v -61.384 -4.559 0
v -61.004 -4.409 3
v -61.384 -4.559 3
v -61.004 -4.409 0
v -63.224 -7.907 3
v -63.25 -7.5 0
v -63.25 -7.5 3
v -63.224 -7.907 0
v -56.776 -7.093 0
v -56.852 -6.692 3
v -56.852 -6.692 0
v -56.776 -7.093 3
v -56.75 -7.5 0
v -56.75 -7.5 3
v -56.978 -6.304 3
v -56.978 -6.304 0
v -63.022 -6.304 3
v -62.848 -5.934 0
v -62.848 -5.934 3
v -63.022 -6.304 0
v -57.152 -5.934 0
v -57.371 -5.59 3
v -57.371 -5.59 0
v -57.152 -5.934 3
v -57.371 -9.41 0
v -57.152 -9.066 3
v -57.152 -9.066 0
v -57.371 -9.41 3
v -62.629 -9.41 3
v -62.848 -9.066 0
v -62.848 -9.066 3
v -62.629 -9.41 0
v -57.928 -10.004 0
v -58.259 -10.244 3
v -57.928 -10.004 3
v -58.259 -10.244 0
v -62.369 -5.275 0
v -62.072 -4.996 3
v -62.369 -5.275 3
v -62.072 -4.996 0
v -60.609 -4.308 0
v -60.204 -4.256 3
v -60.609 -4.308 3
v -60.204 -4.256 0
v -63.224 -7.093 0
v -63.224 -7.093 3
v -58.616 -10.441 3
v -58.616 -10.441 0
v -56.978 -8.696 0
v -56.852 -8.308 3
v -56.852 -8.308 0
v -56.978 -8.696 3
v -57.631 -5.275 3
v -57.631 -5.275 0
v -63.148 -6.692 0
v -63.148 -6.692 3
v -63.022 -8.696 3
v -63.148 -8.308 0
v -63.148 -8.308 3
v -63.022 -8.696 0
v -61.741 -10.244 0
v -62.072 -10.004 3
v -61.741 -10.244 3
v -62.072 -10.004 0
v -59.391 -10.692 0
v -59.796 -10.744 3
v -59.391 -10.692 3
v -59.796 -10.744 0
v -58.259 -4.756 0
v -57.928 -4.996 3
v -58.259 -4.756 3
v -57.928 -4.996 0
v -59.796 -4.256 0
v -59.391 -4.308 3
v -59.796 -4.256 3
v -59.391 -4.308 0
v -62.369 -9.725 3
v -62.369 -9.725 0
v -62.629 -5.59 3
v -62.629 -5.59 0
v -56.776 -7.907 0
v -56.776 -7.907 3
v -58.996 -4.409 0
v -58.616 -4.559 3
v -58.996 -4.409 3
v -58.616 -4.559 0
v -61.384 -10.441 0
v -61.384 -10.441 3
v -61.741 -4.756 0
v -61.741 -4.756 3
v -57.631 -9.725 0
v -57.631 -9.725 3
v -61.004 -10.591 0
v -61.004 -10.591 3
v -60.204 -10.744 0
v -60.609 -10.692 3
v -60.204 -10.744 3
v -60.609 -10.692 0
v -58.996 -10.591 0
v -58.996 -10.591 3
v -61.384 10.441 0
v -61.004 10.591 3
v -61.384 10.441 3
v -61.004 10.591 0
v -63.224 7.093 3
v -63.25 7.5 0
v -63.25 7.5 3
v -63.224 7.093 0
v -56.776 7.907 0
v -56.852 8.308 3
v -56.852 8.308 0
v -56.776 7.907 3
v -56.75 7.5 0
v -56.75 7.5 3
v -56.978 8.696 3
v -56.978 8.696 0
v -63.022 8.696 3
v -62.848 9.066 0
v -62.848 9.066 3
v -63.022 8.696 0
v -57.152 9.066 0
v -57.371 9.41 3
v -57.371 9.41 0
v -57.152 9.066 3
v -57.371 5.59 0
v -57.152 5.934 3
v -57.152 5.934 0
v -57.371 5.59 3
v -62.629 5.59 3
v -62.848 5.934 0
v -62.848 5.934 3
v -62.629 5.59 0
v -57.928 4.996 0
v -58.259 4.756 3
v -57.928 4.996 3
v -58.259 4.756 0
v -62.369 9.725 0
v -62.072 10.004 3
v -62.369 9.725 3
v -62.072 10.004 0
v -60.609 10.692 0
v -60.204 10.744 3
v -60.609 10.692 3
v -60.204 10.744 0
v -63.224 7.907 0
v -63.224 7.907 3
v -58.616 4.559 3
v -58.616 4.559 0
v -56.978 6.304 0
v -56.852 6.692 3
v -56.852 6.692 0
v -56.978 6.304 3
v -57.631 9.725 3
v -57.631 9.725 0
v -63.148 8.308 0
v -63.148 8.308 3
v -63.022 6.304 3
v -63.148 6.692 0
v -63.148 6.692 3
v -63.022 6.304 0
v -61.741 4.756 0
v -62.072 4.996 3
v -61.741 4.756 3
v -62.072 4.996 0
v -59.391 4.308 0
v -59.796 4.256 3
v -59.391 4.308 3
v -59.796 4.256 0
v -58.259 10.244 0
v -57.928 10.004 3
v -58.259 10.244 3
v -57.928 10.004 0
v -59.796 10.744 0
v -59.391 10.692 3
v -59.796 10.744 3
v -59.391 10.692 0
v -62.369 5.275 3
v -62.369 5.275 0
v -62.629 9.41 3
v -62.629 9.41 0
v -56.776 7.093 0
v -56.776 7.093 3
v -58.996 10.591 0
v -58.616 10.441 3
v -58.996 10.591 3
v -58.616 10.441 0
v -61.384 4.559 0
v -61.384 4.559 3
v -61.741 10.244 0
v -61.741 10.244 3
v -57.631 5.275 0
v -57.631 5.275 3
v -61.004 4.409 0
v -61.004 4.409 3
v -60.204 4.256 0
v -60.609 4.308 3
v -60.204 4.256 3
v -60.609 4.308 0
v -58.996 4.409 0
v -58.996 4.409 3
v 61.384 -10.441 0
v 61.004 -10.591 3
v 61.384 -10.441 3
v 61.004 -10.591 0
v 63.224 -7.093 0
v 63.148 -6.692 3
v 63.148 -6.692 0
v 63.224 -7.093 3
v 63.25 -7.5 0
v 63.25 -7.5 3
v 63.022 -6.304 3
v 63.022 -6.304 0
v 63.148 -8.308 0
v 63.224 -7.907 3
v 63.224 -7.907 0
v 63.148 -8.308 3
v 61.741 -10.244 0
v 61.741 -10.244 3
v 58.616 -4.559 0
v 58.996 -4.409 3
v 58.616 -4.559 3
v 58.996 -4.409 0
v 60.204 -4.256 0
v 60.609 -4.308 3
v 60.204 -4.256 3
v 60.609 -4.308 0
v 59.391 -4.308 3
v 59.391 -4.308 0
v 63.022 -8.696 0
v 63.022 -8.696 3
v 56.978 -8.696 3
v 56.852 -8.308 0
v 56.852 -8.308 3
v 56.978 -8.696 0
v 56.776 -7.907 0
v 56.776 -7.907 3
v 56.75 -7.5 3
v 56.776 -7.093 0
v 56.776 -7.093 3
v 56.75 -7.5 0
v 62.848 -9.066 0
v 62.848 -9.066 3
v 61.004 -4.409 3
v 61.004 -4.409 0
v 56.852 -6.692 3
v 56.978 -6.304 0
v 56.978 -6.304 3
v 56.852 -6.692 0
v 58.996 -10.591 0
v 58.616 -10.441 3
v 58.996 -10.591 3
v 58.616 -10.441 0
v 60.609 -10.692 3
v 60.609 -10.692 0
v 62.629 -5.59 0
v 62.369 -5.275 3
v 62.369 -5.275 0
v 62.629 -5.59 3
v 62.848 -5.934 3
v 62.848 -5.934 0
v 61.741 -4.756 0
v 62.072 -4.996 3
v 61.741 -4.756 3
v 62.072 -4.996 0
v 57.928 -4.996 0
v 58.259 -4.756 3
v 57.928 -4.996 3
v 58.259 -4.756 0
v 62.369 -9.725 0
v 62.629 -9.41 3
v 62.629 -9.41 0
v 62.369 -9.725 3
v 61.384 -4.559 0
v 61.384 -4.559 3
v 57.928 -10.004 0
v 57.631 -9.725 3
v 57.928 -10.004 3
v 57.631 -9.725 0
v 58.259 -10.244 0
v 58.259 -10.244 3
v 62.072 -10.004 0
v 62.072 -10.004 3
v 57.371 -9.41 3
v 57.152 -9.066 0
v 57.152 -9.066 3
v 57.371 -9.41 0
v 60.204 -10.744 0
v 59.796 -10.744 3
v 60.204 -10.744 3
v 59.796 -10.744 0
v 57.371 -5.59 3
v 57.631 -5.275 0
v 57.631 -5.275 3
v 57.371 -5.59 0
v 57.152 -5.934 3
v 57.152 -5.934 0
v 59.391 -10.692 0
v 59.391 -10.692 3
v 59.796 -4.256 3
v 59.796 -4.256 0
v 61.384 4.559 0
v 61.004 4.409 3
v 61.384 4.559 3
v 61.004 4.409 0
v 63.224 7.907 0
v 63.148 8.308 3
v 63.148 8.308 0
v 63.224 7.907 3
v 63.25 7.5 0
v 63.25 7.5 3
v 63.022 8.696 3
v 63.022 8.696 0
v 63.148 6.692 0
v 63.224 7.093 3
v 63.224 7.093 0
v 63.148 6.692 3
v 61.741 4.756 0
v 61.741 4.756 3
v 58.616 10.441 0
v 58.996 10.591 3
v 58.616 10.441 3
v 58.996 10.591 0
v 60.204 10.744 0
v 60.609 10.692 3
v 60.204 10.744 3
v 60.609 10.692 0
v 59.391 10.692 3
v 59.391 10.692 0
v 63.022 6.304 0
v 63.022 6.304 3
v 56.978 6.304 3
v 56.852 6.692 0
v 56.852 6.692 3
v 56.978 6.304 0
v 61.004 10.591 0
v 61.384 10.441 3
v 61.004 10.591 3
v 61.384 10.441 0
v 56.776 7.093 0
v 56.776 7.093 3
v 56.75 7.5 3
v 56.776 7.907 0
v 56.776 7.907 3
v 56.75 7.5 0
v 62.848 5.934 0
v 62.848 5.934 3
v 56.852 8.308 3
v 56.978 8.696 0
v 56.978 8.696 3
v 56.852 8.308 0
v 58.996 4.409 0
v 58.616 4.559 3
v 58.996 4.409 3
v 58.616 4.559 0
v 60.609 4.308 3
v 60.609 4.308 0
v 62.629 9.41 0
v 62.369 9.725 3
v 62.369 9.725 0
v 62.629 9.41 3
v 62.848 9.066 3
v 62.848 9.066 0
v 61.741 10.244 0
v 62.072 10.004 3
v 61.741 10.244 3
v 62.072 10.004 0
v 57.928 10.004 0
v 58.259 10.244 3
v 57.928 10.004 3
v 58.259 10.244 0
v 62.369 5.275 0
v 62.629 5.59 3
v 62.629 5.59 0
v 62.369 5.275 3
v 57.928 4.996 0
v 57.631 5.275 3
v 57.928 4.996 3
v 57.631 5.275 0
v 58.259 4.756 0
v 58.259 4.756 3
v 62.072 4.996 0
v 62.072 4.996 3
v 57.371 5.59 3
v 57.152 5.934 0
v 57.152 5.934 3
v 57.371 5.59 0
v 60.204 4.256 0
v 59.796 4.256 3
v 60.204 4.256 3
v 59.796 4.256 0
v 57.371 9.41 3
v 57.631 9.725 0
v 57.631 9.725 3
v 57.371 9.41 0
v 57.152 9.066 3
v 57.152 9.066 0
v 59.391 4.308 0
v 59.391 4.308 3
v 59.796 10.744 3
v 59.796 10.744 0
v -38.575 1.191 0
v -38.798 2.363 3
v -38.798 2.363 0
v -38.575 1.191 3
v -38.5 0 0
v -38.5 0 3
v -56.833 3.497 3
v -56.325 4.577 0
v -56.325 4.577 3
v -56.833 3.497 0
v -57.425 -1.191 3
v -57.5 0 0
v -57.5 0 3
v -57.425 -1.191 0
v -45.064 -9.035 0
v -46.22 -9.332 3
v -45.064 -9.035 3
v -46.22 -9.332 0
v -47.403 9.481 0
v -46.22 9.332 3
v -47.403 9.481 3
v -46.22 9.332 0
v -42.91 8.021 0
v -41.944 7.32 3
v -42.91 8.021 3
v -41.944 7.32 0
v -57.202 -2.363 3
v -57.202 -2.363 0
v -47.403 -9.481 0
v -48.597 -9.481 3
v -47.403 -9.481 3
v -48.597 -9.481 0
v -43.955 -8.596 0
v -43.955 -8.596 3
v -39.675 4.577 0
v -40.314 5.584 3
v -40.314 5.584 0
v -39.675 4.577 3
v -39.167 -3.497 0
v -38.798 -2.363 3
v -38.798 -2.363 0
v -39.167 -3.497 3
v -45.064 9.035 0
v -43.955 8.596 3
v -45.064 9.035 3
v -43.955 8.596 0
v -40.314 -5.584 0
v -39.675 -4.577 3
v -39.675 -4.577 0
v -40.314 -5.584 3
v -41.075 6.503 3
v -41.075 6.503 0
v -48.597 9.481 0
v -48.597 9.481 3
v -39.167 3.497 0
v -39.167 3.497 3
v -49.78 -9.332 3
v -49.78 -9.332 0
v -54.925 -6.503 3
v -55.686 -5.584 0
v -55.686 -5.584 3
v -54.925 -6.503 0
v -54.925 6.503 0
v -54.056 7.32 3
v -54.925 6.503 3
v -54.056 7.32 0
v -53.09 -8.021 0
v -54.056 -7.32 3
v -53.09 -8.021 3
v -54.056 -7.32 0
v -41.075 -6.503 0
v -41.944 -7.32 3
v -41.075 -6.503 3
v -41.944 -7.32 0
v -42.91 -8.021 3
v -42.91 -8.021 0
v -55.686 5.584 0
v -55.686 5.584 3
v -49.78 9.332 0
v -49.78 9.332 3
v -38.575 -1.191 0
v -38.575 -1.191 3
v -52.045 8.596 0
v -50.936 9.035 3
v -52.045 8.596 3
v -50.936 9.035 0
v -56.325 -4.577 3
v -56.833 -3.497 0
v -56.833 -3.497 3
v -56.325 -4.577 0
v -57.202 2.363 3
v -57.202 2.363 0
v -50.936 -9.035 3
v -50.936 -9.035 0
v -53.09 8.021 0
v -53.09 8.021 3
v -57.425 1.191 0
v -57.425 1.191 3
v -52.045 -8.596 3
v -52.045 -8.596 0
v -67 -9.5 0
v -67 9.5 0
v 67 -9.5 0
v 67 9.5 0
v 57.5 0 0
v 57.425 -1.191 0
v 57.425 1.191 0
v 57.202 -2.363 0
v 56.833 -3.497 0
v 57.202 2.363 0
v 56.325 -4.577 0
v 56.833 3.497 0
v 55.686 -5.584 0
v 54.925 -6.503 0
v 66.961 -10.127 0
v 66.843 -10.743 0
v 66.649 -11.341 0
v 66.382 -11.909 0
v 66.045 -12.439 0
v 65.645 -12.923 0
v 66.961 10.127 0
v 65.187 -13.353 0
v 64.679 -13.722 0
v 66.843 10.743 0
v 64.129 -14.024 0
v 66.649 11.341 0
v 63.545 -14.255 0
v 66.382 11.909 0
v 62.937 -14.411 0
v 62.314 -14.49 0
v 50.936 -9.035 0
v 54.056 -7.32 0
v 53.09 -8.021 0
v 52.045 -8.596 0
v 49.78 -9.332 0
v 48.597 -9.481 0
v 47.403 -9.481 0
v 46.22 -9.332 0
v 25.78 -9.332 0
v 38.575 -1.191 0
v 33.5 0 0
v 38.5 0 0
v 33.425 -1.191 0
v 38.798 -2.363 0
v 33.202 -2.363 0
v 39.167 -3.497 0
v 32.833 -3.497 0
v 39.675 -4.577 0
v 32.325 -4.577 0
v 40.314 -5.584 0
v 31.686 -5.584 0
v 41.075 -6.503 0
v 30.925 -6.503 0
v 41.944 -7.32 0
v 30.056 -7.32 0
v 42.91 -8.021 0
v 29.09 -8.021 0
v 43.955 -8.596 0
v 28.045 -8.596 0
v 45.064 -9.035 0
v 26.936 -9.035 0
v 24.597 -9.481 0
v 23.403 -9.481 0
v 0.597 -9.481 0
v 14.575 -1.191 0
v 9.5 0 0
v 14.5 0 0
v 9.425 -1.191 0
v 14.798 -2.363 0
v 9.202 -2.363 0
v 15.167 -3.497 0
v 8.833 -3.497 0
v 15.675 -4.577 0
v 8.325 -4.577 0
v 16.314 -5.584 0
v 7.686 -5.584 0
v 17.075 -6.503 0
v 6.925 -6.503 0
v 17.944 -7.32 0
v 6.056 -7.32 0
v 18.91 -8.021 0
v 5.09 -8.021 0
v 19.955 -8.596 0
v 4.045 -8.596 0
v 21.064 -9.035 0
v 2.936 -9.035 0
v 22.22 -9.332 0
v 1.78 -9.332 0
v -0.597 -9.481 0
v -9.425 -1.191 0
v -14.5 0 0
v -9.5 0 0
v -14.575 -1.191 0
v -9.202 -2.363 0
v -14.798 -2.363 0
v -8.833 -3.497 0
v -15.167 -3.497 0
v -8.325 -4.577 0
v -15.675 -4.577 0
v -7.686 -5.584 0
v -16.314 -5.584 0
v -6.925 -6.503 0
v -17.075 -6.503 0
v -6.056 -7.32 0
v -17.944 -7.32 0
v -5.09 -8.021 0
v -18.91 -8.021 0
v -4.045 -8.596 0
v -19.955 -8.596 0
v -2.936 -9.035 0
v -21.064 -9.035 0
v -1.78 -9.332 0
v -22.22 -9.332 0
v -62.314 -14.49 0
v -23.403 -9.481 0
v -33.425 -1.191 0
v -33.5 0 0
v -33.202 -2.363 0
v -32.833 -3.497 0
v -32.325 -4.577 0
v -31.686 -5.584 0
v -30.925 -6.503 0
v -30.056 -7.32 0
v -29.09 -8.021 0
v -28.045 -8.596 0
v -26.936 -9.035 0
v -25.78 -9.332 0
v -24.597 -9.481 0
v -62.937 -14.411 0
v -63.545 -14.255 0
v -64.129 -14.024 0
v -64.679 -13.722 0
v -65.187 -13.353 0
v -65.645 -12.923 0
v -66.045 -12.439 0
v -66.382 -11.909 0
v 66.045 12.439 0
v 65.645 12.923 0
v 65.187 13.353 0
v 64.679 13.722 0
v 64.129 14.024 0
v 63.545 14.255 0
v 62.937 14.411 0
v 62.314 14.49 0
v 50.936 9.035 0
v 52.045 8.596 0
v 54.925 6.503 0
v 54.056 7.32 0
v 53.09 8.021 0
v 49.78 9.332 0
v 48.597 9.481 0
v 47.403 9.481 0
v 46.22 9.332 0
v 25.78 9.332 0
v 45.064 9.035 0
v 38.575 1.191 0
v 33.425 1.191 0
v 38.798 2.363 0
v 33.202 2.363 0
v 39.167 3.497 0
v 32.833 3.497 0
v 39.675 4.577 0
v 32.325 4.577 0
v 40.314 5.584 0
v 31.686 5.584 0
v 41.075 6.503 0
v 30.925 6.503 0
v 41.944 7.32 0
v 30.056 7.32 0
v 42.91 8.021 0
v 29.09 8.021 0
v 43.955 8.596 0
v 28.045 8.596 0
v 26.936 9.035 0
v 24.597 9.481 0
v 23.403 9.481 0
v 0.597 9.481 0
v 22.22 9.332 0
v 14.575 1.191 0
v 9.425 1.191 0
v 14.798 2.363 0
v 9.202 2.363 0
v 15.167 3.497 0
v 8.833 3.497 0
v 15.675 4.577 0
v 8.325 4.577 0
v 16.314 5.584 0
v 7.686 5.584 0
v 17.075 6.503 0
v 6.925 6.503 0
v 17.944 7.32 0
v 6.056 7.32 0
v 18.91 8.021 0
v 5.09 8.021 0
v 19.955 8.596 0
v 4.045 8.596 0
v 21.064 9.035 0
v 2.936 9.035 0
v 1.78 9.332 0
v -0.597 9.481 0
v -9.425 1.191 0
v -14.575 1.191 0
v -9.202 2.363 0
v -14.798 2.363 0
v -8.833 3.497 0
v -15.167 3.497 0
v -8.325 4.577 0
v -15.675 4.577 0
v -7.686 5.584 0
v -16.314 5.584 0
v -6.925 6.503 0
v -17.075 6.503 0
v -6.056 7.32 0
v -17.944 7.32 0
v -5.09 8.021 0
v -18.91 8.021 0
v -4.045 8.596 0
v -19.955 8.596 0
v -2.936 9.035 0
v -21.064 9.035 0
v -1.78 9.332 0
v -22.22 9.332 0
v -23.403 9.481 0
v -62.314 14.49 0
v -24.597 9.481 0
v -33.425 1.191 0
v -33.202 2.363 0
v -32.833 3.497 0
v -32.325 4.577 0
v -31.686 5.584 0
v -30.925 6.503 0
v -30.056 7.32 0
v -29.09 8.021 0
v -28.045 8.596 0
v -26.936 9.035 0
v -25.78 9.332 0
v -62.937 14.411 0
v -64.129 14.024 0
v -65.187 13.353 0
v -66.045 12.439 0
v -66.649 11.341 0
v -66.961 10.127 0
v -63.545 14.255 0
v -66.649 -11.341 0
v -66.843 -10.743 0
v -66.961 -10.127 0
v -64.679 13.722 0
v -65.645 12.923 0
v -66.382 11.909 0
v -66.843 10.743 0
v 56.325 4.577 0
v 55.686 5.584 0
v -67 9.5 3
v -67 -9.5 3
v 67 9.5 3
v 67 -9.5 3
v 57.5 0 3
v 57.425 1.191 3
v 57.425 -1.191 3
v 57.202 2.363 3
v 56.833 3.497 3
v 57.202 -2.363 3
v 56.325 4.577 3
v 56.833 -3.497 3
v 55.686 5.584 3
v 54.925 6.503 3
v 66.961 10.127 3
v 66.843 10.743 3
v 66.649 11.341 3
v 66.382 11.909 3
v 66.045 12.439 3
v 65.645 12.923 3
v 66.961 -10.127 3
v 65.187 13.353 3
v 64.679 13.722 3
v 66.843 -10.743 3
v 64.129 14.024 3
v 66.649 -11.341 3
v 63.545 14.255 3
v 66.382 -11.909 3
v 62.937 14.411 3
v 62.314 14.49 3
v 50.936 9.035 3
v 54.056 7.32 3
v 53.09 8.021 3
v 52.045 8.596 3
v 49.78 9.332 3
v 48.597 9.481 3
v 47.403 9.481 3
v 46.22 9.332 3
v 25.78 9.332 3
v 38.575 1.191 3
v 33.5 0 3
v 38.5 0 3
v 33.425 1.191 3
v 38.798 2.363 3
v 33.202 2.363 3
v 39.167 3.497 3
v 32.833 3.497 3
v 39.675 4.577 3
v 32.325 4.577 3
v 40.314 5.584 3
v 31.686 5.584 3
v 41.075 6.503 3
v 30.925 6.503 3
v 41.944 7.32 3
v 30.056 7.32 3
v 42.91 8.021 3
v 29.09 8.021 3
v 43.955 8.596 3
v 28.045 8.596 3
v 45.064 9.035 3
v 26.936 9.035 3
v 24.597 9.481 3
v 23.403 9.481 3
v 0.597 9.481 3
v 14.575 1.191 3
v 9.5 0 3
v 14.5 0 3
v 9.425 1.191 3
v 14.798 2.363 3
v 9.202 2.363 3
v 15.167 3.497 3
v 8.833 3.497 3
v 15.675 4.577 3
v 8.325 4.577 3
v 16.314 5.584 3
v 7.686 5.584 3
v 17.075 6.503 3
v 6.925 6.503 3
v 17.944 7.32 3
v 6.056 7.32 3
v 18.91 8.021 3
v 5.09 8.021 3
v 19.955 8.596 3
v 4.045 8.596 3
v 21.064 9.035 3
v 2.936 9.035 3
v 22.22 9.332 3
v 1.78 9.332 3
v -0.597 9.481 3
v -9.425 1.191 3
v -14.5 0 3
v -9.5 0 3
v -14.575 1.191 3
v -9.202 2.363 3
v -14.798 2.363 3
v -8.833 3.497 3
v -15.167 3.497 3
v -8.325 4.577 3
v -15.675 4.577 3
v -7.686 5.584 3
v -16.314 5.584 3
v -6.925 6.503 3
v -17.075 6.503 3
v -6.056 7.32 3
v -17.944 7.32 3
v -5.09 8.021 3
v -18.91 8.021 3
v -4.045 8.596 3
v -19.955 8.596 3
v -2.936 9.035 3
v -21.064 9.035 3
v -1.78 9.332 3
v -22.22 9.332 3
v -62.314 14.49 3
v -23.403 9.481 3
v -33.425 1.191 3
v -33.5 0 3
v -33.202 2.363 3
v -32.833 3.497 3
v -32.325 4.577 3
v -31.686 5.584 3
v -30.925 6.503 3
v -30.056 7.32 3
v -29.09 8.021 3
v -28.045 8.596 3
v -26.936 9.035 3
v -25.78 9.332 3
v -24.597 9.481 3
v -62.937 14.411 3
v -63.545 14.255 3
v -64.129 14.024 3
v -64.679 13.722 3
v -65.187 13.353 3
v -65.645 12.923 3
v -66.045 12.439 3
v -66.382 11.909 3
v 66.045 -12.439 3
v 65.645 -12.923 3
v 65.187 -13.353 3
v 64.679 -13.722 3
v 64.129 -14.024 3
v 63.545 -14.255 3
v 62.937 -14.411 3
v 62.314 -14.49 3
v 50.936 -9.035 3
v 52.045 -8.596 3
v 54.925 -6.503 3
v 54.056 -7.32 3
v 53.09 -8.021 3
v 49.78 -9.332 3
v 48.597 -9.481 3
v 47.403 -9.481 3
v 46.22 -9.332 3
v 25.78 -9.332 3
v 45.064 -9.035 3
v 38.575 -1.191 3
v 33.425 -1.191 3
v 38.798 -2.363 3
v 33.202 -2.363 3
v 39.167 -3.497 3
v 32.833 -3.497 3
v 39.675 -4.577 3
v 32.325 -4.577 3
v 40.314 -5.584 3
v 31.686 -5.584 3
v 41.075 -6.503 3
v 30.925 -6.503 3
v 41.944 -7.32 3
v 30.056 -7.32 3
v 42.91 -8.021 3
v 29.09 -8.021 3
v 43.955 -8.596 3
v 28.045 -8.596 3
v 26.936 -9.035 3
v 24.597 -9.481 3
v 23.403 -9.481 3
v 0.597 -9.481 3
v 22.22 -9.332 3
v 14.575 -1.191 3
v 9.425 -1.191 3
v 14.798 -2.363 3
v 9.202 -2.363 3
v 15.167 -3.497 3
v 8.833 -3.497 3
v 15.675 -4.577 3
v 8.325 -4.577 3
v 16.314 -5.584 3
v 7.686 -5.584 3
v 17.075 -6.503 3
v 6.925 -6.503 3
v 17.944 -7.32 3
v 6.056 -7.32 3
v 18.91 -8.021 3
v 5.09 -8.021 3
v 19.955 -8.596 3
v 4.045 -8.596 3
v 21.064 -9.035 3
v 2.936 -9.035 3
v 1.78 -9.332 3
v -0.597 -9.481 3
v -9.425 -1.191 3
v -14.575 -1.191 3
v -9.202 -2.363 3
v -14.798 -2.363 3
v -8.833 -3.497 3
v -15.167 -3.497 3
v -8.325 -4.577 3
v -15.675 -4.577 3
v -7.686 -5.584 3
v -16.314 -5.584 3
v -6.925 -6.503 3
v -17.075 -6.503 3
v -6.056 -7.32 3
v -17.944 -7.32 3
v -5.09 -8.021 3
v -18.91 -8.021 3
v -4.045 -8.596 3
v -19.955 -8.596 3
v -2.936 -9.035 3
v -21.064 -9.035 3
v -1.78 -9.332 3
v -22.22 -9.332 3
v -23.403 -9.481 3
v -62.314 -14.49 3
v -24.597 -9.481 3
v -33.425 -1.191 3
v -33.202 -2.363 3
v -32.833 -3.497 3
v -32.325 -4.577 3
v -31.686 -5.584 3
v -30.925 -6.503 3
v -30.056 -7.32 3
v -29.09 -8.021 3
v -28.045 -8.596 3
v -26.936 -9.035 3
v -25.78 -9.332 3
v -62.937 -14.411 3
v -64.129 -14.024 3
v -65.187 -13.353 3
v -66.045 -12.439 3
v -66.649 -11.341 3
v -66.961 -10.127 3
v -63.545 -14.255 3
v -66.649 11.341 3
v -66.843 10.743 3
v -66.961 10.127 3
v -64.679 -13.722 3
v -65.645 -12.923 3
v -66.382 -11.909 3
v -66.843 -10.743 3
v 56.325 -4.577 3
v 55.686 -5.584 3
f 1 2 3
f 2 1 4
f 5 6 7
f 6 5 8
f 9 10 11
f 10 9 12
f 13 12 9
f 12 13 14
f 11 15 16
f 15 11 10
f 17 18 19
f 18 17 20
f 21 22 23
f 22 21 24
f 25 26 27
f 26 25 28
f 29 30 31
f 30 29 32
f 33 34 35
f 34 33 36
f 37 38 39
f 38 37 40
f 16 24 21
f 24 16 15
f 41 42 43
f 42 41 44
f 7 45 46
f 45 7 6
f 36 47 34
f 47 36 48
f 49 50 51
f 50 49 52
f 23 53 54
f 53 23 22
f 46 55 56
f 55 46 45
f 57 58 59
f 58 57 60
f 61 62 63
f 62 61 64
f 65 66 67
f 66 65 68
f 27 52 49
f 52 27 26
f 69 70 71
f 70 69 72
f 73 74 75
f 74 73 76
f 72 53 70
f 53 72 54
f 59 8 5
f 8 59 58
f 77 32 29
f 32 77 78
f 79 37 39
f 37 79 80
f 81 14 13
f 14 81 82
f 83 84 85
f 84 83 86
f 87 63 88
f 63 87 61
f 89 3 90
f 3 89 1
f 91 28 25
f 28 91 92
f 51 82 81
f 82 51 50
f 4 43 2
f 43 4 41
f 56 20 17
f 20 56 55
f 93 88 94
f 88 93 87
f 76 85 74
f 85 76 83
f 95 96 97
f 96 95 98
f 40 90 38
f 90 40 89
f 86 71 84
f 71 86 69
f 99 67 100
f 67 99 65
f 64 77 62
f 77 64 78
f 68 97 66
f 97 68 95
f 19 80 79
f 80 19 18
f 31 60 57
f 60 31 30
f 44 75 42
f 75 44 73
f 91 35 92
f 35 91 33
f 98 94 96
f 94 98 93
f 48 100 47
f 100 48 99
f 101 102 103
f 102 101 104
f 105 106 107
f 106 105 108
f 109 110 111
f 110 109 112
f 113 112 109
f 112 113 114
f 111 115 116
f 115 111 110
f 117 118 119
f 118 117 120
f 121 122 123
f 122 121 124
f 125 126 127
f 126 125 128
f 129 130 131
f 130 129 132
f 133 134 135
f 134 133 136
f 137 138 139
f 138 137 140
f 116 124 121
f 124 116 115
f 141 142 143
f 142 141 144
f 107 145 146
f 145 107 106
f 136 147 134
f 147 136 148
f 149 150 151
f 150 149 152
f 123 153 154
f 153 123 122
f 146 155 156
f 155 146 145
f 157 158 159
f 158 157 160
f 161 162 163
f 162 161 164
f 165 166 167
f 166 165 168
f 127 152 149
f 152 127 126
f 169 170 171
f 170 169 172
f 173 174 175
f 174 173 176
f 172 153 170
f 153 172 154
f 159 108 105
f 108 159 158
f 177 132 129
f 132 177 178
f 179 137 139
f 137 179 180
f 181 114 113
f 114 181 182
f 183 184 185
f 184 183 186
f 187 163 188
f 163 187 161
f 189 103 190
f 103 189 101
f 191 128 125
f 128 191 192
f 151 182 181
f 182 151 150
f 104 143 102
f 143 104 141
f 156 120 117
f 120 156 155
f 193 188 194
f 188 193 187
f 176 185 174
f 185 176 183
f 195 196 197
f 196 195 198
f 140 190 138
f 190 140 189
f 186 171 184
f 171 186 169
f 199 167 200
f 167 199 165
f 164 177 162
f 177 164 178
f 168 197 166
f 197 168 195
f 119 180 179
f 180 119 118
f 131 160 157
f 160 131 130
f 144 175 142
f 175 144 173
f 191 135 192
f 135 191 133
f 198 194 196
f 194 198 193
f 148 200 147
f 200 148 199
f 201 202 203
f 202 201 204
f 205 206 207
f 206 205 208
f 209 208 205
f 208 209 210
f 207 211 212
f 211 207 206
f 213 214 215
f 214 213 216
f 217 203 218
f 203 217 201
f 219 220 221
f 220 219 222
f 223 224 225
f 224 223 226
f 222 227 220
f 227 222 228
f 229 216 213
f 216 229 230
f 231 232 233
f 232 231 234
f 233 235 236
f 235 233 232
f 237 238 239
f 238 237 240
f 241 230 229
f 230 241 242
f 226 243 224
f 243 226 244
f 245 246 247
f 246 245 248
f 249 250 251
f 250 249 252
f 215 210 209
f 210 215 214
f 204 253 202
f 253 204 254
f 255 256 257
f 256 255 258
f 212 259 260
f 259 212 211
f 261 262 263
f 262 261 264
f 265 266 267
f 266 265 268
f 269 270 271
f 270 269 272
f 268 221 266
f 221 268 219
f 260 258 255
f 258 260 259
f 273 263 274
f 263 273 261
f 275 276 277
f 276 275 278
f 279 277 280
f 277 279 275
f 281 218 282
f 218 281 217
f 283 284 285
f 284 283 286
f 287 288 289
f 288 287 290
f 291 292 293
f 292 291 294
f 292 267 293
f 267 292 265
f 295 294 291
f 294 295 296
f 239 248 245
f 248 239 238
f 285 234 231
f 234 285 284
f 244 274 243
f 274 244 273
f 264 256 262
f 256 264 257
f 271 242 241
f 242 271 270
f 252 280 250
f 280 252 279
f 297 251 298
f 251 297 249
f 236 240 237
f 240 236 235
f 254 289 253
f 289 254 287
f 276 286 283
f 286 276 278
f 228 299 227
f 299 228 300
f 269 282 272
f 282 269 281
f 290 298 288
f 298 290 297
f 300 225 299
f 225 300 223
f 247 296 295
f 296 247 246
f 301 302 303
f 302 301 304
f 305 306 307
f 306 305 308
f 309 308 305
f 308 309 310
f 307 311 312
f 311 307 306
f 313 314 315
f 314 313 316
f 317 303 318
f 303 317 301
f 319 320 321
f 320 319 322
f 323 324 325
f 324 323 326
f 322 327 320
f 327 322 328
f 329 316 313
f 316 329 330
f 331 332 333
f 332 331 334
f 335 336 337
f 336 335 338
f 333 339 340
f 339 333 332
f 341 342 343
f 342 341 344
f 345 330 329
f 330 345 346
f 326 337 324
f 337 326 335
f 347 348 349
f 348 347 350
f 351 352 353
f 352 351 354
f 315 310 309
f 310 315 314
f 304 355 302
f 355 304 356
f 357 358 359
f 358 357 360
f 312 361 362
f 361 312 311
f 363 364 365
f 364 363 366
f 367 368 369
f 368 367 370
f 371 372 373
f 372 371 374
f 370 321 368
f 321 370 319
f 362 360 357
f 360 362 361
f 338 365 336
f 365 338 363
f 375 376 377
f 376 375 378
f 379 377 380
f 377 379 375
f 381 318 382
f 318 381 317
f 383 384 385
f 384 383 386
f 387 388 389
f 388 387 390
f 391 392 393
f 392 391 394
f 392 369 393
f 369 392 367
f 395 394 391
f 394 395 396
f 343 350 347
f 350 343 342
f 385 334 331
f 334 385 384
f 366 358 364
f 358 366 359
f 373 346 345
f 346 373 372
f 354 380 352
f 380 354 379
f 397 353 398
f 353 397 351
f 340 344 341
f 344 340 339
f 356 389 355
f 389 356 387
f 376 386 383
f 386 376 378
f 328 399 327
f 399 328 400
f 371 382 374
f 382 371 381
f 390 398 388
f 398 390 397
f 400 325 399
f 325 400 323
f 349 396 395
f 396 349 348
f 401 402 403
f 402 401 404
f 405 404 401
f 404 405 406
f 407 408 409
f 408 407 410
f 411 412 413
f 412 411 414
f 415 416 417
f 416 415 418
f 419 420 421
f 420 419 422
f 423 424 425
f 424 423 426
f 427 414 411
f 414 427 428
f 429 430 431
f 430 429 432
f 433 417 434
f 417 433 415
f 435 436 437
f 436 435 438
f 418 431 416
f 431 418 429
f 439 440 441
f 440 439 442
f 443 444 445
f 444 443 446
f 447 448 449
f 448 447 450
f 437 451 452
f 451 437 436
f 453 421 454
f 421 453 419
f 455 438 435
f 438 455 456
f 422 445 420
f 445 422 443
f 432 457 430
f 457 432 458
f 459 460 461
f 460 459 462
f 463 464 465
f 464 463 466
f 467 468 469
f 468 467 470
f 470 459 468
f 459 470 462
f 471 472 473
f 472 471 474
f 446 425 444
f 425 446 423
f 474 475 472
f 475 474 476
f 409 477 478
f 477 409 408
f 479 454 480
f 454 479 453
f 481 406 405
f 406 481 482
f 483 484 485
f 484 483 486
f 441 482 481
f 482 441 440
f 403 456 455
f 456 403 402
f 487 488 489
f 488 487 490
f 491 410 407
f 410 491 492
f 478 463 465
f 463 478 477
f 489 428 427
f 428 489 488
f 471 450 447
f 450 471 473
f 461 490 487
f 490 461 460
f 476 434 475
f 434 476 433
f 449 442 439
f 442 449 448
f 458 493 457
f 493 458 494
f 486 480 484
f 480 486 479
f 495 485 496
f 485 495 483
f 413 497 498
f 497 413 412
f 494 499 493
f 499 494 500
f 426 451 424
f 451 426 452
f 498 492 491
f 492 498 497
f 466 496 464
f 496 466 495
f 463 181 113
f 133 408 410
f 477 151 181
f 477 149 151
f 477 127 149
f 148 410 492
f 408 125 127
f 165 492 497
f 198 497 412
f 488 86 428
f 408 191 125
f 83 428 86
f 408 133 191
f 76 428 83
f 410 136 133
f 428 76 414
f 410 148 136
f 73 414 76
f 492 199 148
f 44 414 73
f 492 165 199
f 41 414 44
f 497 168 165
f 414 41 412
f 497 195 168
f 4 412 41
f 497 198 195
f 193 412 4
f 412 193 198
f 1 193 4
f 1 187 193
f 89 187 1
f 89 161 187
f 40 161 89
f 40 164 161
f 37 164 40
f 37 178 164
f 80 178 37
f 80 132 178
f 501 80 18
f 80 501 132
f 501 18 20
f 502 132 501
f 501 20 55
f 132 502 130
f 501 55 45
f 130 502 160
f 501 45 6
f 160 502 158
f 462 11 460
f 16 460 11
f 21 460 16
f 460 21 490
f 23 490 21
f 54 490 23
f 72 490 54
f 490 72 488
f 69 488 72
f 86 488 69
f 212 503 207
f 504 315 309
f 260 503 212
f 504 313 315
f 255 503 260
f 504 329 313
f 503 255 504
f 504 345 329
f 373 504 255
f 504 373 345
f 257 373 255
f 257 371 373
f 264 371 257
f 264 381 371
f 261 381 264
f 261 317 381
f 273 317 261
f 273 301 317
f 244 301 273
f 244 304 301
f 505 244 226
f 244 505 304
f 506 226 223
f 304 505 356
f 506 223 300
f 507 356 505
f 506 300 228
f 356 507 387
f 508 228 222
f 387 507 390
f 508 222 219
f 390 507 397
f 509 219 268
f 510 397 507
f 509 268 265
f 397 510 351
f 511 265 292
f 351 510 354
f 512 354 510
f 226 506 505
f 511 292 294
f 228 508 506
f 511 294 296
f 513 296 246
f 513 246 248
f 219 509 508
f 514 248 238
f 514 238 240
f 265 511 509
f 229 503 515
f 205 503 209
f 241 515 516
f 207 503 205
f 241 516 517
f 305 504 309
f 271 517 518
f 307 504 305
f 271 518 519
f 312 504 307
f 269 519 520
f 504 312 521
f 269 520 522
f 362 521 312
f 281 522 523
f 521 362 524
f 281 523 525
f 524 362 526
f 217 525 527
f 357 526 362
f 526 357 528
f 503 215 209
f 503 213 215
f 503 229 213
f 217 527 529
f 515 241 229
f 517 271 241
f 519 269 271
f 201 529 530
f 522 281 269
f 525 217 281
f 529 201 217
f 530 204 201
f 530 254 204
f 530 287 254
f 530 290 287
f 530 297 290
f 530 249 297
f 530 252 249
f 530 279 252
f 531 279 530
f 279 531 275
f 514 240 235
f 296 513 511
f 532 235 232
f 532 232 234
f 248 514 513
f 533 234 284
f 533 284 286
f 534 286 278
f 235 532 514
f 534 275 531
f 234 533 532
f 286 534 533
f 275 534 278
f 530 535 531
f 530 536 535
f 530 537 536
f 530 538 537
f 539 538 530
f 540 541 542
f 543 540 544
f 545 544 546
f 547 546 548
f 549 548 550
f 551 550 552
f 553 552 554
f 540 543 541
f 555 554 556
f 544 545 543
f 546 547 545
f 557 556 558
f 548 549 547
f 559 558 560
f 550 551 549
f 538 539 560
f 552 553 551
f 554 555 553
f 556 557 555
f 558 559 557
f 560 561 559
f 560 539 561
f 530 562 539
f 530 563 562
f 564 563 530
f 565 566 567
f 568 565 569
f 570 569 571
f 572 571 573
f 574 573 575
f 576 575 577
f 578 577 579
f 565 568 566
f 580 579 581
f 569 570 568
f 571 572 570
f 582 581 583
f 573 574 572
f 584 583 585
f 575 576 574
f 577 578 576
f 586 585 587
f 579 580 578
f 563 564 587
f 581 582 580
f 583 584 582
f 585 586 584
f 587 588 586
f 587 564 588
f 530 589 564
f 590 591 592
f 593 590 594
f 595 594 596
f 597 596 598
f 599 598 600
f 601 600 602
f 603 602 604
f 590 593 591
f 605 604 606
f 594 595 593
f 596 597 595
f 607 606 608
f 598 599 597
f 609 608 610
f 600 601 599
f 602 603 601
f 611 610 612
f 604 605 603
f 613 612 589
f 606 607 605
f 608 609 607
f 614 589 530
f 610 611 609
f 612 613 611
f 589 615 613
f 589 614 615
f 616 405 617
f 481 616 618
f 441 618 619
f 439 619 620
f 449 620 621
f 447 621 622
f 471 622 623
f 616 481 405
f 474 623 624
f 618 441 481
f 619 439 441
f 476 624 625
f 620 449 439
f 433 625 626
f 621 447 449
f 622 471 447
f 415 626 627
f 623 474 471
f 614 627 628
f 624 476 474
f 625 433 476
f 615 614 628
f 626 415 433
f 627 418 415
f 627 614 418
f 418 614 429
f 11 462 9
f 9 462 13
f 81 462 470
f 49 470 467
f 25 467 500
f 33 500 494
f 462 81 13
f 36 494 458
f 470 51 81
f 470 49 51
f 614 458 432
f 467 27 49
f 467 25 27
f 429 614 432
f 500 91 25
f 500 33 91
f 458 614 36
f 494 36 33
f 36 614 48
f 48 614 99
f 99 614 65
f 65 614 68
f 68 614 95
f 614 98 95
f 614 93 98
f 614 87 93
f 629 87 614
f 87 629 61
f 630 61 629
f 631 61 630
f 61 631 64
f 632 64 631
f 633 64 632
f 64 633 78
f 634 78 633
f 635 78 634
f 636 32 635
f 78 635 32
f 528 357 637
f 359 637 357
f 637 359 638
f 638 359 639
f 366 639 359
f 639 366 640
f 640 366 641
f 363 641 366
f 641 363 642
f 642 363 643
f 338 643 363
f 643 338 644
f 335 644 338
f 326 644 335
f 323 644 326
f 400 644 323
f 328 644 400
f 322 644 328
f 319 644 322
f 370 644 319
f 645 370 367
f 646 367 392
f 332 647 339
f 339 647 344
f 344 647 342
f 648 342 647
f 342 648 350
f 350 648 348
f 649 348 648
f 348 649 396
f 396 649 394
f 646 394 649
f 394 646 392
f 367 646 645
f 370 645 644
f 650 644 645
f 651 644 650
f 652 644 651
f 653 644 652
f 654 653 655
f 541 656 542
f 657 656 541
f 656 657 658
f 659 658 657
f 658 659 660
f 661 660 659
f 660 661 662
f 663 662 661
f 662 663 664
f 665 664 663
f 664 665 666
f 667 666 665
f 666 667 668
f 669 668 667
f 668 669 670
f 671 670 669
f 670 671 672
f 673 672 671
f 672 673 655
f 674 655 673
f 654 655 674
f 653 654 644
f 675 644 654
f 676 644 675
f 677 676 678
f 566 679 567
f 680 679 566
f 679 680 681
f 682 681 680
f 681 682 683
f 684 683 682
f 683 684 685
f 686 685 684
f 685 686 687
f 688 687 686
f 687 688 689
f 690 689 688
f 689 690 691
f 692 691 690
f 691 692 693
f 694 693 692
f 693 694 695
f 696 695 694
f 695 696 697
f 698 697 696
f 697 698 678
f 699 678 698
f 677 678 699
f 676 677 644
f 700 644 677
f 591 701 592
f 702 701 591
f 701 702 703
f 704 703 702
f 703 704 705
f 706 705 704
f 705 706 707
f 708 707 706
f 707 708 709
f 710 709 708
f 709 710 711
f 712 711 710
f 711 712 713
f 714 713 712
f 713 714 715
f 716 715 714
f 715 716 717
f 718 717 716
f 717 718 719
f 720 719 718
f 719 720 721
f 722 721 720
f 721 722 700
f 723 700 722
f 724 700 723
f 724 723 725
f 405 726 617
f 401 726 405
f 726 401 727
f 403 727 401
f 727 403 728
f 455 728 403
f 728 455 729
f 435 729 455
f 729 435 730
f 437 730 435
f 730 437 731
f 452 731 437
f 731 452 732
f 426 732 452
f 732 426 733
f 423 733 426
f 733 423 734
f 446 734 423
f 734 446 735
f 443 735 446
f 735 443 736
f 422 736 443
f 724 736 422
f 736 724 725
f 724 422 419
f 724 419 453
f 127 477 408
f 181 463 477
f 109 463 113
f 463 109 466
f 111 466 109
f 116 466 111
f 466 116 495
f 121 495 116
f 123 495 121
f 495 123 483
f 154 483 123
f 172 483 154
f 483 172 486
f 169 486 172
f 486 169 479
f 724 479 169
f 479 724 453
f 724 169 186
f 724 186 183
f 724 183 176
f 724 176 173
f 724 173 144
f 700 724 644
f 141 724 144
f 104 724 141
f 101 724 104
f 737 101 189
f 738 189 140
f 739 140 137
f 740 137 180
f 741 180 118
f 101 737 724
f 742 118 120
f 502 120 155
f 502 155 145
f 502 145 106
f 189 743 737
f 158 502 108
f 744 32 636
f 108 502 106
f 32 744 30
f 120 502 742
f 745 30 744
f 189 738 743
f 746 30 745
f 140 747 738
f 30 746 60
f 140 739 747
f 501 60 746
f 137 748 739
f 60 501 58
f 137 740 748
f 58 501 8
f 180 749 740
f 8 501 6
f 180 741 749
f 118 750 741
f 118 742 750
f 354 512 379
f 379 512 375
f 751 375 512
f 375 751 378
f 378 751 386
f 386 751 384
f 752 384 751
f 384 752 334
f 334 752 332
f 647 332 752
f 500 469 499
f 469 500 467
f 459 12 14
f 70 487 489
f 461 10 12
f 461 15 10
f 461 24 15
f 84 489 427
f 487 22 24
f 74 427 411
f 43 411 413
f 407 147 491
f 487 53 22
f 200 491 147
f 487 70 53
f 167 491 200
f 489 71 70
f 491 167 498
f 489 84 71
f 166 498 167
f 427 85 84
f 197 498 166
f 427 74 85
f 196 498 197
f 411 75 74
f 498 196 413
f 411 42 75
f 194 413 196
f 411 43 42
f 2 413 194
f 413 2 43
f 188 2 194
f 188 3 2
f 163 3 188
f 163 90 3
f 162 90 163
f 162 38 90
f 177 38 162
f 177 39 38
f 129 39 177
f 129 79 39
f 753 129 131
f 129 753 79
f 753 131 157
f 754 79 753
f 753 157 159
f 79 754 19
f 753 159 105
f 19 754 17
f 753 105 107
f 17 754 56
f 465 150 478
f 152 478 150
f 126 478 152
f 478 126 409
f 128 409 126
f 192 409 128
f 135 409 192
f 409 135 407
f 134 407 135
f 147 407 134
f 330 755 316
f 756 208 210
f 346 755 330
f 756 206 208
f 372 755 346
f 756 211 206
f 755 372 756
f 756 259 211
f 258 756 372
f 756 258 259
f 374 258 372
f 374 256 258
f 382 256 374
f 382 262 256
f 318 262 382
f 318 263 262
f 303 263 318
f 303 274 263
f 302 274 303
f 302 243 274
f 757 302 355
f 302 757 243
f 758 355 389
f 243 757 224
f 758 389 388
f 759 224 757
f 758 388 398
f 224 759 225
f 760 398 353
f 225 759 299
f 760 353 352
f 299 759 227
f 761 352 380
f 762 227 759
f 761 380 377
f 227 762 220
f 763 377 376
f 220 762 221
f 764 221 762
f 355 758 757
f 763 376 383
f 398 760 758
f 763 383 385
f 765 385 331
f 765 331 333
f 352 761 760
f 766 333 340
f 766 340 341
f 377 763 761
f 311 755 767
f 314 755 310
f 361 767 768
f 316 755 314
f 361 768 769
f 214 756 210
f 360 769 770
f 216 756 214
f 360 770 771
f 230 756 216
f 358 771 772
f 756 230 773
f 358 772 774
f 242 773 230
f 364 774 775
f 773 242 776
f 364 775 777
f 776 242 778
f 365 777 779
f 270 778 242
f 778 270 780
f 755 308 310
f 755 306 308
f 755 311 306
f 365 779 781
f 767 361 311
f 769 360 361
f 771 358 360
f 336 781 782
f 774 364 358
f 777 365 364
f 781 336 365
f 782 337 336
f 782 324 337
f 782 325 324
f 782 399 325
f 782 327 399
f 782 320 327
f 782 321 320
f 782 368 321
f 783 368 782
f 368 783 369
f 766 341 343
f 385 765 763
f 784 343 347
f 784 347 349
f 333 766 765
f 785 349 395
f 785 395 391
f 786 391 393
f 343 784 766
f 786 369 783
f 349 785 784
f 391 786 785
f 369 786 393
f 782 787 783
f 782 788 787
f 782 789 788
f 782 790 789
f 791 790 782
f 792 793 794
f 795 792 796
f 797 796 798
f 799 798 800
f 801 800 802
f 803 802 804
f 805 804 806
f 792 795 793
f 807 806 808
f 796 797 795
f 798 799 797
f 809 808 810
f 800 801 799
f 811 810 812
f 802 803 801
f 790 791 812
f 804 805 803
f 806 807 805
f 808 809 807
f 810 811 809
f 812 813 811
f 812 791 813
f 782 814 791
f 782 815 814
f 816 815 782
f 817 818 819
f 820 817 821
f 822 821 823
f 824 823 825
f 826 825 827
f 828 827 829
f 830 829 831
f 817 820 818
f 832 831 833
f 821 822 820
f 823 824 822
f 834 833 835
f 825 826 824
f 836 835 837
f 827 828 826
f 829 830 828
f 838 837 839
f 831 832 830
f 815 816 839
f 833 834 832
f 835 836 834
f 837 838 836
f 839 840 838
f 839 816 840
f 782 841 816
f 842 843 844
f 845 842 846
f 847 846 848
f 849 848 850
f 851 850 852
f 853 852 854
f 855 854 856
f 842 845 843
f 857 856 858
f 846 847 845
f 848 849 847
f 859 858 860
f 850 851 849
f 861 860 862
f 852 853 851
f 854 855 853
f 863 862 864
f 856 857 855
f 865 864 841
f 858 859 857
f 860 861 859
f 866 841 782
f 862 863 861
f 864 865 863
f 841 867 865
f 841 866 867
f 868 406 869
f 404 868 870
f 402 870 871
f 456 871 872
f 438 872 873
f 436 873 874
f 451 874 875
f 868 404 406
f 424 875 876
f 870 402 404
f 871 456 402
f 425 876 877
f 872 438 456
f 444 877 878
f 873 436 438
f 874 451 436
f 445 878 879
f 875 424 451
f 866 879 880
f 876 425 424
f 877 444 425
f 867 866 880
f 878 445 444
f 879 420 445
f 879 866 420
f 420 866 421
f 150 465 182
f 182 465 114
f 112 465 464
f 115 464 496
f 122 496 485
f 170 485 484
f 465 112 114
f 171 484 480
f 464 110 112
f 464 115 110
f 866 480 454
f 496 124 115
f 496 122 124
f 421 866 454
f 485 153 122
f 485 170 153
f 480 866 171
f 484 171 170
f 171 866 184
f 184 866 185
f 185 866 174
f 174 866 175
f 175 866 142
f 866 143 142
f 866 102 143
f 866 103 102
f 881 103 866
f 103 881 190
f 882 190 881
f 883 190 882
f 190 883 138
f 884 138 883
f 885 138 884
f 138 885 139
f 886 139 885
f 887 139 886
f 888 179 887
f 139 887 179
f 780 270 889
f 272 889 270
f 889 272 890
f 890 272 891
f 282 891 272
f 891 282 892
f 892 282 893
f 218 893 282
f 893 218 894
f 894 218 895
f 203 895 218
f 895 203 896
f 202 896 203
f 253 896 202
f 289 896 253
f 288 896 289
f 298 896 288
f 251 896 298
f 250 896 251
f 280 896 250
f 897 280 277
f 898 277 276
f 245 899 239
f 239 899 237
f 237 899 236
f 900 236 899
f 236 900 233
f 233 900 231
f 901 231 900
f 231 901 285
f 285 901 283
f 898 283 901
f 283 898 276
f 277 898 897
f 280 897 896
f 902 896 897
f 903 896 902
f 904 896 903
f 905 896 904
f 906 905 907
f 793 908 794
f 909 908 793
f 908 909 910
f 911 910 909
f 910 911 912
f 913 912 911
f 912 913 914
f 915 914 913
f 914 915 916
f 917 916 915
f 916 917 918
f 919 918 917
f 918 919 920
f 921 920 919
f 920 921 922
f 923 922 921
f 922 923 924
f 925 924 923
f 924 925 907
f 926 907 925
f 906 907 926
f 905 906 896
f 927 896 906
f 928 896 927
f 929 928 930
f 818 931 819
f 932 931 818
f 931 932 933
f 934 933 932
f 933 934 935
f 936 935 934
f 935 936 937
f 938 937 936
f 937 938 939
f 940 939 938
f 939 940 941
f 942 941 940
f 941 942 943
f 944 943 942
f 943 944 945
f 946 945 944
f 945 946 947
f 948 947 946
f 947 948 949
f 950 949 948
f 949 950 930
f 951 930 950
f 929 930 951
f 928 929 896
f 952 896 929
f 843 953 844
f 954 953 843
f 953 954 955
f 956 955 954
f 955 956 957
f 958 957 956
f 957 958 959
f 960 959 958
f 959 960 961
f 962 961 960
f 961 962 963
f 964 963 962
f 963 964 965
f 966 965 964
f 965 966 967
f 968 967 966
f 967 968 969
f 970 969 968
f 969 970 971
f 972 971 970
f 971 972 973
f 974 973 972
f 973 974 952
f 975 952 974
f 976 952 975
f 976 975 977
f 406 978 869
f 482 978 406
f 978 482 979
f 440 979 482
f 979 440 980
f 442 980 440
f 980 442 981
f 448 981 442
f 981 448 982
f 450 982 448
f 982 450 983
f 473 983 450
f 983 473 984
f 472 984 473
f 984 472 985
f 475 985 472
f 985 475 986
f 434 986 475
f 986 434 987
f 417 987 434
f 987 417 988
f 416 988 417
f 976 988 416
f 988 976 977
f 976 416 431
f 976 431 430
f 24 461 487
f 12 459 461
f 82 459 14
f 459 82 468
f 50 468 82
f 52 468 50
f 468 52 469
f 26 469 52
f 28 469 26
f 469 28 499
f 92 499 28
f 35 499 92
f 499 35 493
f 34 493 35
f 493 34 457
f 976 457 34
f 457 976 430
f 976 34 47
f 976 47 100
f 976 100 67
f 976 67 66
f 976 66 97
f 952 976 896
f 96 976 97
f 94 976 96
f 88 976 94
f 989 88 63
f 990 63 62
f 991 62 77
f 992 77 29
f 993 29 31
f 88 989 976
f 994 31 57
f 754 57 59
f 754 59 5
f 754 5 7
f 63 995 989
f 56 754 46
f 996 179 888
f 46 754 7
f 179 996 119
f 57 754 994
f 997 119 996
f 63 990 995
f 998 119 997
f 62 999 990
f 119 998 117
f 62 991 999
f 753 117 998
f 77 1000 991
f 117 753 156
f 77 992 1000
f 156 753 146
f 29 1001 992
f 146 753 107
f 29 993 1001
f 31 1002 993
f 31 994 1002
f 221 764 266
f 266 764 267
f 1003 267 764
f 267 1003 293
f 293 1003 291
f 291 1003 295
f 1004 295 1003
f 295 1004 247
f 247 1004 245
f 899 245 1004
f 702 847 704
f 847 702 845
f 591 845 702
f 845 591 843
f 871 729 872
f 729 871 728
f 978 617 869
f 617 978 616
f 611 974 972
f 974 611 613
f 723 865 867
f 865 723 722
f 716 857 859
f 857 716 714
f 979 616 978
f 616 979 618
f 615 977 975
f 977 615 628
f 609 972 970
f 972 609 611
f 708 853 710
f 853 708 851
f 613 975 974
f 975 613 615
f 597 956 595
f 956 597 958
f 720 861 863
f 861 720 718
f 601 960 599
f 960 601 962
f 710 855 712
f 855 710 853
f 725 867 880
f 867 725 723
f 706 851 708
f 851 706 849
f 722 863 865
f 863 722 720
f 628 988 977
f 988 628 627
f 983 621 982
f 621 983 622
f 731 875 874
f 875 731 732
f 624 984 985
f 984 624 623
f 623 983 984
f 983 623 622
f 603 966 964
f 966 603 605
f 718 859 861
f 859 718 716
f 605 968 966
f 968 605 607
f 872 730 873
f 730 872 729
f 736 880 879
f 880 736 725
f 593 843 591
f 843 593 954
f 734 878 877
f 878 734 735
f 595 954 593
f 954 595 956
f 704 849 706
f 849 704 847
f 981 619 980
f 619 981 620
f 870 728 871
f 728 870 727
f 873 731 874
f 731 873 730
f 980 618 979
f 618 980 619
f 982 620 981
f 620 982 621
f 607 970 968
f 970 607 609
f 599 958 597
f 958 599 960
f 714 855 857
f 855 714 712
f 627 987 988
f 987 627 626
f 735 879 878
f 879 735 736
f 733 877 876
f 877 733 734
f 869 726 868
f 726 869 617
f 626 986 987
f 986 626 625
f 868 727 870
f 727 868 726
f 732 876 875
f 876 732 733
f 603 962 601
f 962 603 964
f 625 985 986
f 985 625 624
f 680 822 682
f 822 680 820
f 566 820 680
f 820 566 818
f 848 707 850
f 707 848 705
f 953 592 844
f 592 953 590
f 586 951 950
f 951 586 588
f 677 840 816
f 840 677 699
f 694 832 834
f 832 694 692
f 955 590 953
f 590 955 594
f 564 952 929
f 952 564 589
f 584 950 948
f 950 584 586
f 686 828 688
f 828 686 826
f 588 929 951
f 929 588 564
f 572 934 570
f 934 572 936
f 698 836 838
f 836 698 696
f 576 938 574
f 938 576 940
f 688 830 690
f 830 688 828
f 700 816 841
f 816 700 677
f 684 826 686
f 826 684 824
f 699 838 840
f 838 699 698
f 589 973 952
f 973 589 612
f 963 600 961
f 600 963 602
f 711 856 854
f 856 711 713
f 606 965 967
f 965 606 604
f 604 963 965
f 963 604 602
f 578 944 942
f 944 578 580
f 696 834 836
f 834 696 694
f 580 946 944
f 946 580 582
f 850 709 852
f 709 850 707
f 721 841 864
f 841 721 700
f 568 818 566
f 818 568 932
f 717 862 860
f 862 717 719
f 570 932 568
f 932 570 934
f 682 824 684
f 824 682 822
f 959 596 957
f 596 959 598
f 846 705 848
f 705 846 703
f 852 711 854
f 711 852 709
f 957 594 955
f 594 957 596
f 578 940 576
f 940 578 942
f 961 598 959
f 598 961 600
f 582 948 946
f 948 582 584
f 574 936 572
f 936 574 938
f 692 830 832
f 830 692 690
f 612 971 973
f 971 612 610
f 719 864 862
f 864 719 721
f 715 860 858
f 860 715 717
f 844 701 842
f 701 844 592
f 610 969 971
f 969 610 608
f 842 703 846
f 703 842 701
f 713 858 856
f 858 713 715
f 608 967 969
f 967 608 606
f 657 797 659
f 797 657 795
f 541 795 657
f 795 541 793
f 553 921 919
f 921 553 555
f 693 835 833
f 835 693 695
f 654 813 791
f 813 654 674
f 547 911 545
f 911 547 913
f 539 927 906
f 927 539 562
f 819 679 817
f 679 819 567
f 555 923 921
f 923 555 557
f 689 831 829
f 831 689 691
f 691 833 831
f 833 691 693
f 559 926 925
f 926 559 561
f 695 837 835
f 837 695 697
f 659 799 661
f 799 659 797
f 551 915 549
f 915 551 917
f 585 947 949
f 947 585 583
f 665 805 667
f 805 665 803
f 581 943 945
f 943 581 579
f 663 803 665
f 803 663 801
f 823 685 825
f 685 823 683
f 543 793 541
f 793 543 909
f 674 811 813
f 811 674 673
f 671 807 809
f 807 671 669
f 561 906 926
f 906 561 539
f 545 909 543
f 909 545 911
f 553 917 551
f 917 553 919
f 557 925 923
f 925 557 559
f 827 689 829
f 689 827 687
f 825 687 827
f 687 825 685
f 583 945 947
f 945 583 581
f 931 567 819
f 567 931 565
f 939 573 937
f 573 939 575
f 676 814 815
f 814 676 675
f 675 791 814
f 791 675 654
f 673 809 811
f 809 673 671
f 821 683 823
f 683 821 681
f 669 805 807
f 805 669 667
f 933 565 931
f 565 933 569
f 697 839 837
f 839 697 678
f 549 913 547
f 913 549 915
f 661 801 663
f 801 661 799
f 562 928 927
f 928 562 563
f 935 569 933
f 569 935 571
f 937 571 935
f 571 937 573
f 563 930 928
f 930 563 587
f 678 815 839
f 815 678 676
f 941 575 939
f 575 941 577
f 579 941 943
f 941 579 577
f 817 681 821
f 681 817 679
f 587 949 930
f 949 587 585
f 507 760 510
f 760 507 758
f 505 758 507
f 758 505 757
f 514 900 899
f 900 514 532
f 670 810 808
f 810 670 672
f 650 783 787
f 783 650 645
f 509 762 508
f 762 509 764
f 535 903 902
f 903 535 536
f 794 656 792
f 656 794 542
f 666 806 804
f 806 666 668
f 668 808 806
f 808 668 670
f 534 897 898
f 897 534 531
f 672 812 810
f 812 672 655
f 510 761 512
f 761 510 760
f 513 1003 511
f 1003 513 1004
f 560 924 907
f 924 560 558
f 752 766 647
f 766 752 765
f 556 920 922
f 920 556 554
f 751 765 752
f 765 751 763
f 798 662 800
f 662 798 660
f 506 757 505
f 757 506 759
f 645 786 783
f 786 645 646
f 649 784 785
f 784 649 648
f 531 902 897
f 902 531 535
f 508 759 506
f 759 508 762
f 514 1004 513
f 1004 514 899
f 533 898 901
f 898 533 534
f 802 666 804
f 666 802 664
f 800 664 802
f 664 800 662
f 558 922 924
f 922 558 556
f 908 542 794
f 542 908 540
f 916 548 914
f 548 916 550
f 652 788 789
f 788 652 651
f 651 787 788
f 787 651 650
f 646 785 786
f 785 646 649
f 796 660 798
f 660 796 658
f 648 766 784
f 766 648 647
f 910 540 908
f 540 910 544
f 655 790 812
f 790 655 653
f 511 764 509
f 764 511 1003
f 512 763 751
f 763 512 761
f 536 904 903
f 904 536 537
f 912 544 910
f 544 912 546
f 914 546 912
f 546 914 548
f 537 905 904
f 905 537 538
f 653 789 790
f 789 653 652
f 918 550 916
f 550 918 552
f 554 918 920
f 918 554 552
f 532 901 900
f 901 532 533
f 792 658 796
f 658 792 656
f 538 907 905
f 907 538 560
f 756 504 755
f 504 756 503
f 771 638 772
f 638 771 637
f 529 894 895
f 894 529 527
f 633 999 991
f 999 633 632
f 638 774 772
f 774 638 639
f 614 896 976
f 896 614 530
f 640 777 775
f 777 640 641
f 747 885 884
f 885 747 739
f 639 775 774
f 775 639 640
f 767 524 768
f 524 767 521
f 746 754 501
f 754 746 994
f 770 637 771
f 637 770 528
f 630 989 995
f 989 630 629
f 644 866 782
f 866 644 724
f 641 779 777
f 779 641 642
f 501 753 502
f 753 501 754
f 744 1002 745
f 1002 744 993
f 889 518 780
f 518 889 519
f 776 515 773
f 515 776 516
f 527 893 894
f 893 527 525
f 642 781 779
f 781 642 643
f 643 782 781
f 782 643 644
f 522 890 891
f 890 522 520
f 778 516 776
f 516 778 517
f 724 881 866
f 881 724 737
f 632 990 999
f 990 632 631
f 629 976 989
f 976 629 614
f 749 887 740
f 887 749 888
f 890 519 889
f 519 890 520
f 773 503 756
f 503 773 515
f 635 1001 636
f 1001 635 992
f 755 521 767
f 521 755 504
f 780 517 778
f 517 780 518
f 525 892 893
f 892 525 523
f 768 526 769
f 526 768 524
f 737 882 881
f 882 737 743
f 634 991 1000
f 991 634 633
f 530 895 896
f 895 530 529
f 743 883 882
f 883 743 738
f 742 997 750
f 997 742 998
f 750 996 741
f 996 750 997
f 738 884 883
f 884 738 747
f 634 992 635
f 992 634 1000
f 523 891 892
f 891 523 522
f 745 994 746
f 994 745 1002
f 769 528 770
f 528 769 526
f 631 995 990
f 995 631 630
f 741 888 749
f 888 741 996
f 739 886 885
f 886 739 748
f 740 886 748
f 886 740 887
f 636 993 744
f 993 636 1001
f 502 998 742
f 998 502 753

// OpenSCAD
$fn = 50;

difference() {
	union() {
		hull() {
			translate(v = [-62.0, 9.5, 0]) {
				cylinder(h = 3, r = 5);
			}
			translate(v = [62.0, 9.5, 0]) {
				cylinder(h = 3, r = 5);
			}
			translate(v = [-62.0, -9.5, 0]) {
				cylinder(h = 3, r = 5);
			}
			translate(v = [62.0, -9.5, 0]) {
				cylinder(h = 3, r = 5);
			}
		}
	}
	union() {
		translate(v = [-60.0, -7.5, -100.0]) {
			cylinder(h = 200, r = 3.25);
		}
		translate(v = [-60.0, 7.5, -100.0]) {
			cylinder(h = 200, r = 3.25);
		}
		translate(v = [60.0, -7.5, -100.0]) {
			cylinder(h = 200, r = 3.25);
		}
		translate(v = [60.0, 7.5, -100.0]) {
			cylinder(h = 200, r = 3.25);
		}
		translate(v = [-60.0, -7.5, -100.0]) {
			cylinder(h = 200, r = 1.8);
		}
		translate(v = [-60.0, 7.5, -100.0]) {
			cylinder(h = 200, r = 1.8);
		}
		translate(v = [60.0, -7.5, -100.0]) {
			cylinder(h = 200, r = 1.8);
		}
		translate(v = [60.0, 7.5, -100.0]) {
			cylinder(h = 200, r = 1.8);
		}
		translate(v = [-48.0, 0, 0.0]) {
			cylinder(h = 3, r = 9.5);
		}
		translate(v = [-24.0, 0, 0.0]) {
			cylinder(h = 3, r = 9.5);
		}
		cylinder(h = 3, r = 9.5);
		translate(v = [24.0, 0, 0.0]) {
			cylinder(h = 3, r = 9.5);
		}
		translate(v = [48.0, 0, 0.0]) {
			cylinder(h = 3, r = 9.5);
		}
	}
}
